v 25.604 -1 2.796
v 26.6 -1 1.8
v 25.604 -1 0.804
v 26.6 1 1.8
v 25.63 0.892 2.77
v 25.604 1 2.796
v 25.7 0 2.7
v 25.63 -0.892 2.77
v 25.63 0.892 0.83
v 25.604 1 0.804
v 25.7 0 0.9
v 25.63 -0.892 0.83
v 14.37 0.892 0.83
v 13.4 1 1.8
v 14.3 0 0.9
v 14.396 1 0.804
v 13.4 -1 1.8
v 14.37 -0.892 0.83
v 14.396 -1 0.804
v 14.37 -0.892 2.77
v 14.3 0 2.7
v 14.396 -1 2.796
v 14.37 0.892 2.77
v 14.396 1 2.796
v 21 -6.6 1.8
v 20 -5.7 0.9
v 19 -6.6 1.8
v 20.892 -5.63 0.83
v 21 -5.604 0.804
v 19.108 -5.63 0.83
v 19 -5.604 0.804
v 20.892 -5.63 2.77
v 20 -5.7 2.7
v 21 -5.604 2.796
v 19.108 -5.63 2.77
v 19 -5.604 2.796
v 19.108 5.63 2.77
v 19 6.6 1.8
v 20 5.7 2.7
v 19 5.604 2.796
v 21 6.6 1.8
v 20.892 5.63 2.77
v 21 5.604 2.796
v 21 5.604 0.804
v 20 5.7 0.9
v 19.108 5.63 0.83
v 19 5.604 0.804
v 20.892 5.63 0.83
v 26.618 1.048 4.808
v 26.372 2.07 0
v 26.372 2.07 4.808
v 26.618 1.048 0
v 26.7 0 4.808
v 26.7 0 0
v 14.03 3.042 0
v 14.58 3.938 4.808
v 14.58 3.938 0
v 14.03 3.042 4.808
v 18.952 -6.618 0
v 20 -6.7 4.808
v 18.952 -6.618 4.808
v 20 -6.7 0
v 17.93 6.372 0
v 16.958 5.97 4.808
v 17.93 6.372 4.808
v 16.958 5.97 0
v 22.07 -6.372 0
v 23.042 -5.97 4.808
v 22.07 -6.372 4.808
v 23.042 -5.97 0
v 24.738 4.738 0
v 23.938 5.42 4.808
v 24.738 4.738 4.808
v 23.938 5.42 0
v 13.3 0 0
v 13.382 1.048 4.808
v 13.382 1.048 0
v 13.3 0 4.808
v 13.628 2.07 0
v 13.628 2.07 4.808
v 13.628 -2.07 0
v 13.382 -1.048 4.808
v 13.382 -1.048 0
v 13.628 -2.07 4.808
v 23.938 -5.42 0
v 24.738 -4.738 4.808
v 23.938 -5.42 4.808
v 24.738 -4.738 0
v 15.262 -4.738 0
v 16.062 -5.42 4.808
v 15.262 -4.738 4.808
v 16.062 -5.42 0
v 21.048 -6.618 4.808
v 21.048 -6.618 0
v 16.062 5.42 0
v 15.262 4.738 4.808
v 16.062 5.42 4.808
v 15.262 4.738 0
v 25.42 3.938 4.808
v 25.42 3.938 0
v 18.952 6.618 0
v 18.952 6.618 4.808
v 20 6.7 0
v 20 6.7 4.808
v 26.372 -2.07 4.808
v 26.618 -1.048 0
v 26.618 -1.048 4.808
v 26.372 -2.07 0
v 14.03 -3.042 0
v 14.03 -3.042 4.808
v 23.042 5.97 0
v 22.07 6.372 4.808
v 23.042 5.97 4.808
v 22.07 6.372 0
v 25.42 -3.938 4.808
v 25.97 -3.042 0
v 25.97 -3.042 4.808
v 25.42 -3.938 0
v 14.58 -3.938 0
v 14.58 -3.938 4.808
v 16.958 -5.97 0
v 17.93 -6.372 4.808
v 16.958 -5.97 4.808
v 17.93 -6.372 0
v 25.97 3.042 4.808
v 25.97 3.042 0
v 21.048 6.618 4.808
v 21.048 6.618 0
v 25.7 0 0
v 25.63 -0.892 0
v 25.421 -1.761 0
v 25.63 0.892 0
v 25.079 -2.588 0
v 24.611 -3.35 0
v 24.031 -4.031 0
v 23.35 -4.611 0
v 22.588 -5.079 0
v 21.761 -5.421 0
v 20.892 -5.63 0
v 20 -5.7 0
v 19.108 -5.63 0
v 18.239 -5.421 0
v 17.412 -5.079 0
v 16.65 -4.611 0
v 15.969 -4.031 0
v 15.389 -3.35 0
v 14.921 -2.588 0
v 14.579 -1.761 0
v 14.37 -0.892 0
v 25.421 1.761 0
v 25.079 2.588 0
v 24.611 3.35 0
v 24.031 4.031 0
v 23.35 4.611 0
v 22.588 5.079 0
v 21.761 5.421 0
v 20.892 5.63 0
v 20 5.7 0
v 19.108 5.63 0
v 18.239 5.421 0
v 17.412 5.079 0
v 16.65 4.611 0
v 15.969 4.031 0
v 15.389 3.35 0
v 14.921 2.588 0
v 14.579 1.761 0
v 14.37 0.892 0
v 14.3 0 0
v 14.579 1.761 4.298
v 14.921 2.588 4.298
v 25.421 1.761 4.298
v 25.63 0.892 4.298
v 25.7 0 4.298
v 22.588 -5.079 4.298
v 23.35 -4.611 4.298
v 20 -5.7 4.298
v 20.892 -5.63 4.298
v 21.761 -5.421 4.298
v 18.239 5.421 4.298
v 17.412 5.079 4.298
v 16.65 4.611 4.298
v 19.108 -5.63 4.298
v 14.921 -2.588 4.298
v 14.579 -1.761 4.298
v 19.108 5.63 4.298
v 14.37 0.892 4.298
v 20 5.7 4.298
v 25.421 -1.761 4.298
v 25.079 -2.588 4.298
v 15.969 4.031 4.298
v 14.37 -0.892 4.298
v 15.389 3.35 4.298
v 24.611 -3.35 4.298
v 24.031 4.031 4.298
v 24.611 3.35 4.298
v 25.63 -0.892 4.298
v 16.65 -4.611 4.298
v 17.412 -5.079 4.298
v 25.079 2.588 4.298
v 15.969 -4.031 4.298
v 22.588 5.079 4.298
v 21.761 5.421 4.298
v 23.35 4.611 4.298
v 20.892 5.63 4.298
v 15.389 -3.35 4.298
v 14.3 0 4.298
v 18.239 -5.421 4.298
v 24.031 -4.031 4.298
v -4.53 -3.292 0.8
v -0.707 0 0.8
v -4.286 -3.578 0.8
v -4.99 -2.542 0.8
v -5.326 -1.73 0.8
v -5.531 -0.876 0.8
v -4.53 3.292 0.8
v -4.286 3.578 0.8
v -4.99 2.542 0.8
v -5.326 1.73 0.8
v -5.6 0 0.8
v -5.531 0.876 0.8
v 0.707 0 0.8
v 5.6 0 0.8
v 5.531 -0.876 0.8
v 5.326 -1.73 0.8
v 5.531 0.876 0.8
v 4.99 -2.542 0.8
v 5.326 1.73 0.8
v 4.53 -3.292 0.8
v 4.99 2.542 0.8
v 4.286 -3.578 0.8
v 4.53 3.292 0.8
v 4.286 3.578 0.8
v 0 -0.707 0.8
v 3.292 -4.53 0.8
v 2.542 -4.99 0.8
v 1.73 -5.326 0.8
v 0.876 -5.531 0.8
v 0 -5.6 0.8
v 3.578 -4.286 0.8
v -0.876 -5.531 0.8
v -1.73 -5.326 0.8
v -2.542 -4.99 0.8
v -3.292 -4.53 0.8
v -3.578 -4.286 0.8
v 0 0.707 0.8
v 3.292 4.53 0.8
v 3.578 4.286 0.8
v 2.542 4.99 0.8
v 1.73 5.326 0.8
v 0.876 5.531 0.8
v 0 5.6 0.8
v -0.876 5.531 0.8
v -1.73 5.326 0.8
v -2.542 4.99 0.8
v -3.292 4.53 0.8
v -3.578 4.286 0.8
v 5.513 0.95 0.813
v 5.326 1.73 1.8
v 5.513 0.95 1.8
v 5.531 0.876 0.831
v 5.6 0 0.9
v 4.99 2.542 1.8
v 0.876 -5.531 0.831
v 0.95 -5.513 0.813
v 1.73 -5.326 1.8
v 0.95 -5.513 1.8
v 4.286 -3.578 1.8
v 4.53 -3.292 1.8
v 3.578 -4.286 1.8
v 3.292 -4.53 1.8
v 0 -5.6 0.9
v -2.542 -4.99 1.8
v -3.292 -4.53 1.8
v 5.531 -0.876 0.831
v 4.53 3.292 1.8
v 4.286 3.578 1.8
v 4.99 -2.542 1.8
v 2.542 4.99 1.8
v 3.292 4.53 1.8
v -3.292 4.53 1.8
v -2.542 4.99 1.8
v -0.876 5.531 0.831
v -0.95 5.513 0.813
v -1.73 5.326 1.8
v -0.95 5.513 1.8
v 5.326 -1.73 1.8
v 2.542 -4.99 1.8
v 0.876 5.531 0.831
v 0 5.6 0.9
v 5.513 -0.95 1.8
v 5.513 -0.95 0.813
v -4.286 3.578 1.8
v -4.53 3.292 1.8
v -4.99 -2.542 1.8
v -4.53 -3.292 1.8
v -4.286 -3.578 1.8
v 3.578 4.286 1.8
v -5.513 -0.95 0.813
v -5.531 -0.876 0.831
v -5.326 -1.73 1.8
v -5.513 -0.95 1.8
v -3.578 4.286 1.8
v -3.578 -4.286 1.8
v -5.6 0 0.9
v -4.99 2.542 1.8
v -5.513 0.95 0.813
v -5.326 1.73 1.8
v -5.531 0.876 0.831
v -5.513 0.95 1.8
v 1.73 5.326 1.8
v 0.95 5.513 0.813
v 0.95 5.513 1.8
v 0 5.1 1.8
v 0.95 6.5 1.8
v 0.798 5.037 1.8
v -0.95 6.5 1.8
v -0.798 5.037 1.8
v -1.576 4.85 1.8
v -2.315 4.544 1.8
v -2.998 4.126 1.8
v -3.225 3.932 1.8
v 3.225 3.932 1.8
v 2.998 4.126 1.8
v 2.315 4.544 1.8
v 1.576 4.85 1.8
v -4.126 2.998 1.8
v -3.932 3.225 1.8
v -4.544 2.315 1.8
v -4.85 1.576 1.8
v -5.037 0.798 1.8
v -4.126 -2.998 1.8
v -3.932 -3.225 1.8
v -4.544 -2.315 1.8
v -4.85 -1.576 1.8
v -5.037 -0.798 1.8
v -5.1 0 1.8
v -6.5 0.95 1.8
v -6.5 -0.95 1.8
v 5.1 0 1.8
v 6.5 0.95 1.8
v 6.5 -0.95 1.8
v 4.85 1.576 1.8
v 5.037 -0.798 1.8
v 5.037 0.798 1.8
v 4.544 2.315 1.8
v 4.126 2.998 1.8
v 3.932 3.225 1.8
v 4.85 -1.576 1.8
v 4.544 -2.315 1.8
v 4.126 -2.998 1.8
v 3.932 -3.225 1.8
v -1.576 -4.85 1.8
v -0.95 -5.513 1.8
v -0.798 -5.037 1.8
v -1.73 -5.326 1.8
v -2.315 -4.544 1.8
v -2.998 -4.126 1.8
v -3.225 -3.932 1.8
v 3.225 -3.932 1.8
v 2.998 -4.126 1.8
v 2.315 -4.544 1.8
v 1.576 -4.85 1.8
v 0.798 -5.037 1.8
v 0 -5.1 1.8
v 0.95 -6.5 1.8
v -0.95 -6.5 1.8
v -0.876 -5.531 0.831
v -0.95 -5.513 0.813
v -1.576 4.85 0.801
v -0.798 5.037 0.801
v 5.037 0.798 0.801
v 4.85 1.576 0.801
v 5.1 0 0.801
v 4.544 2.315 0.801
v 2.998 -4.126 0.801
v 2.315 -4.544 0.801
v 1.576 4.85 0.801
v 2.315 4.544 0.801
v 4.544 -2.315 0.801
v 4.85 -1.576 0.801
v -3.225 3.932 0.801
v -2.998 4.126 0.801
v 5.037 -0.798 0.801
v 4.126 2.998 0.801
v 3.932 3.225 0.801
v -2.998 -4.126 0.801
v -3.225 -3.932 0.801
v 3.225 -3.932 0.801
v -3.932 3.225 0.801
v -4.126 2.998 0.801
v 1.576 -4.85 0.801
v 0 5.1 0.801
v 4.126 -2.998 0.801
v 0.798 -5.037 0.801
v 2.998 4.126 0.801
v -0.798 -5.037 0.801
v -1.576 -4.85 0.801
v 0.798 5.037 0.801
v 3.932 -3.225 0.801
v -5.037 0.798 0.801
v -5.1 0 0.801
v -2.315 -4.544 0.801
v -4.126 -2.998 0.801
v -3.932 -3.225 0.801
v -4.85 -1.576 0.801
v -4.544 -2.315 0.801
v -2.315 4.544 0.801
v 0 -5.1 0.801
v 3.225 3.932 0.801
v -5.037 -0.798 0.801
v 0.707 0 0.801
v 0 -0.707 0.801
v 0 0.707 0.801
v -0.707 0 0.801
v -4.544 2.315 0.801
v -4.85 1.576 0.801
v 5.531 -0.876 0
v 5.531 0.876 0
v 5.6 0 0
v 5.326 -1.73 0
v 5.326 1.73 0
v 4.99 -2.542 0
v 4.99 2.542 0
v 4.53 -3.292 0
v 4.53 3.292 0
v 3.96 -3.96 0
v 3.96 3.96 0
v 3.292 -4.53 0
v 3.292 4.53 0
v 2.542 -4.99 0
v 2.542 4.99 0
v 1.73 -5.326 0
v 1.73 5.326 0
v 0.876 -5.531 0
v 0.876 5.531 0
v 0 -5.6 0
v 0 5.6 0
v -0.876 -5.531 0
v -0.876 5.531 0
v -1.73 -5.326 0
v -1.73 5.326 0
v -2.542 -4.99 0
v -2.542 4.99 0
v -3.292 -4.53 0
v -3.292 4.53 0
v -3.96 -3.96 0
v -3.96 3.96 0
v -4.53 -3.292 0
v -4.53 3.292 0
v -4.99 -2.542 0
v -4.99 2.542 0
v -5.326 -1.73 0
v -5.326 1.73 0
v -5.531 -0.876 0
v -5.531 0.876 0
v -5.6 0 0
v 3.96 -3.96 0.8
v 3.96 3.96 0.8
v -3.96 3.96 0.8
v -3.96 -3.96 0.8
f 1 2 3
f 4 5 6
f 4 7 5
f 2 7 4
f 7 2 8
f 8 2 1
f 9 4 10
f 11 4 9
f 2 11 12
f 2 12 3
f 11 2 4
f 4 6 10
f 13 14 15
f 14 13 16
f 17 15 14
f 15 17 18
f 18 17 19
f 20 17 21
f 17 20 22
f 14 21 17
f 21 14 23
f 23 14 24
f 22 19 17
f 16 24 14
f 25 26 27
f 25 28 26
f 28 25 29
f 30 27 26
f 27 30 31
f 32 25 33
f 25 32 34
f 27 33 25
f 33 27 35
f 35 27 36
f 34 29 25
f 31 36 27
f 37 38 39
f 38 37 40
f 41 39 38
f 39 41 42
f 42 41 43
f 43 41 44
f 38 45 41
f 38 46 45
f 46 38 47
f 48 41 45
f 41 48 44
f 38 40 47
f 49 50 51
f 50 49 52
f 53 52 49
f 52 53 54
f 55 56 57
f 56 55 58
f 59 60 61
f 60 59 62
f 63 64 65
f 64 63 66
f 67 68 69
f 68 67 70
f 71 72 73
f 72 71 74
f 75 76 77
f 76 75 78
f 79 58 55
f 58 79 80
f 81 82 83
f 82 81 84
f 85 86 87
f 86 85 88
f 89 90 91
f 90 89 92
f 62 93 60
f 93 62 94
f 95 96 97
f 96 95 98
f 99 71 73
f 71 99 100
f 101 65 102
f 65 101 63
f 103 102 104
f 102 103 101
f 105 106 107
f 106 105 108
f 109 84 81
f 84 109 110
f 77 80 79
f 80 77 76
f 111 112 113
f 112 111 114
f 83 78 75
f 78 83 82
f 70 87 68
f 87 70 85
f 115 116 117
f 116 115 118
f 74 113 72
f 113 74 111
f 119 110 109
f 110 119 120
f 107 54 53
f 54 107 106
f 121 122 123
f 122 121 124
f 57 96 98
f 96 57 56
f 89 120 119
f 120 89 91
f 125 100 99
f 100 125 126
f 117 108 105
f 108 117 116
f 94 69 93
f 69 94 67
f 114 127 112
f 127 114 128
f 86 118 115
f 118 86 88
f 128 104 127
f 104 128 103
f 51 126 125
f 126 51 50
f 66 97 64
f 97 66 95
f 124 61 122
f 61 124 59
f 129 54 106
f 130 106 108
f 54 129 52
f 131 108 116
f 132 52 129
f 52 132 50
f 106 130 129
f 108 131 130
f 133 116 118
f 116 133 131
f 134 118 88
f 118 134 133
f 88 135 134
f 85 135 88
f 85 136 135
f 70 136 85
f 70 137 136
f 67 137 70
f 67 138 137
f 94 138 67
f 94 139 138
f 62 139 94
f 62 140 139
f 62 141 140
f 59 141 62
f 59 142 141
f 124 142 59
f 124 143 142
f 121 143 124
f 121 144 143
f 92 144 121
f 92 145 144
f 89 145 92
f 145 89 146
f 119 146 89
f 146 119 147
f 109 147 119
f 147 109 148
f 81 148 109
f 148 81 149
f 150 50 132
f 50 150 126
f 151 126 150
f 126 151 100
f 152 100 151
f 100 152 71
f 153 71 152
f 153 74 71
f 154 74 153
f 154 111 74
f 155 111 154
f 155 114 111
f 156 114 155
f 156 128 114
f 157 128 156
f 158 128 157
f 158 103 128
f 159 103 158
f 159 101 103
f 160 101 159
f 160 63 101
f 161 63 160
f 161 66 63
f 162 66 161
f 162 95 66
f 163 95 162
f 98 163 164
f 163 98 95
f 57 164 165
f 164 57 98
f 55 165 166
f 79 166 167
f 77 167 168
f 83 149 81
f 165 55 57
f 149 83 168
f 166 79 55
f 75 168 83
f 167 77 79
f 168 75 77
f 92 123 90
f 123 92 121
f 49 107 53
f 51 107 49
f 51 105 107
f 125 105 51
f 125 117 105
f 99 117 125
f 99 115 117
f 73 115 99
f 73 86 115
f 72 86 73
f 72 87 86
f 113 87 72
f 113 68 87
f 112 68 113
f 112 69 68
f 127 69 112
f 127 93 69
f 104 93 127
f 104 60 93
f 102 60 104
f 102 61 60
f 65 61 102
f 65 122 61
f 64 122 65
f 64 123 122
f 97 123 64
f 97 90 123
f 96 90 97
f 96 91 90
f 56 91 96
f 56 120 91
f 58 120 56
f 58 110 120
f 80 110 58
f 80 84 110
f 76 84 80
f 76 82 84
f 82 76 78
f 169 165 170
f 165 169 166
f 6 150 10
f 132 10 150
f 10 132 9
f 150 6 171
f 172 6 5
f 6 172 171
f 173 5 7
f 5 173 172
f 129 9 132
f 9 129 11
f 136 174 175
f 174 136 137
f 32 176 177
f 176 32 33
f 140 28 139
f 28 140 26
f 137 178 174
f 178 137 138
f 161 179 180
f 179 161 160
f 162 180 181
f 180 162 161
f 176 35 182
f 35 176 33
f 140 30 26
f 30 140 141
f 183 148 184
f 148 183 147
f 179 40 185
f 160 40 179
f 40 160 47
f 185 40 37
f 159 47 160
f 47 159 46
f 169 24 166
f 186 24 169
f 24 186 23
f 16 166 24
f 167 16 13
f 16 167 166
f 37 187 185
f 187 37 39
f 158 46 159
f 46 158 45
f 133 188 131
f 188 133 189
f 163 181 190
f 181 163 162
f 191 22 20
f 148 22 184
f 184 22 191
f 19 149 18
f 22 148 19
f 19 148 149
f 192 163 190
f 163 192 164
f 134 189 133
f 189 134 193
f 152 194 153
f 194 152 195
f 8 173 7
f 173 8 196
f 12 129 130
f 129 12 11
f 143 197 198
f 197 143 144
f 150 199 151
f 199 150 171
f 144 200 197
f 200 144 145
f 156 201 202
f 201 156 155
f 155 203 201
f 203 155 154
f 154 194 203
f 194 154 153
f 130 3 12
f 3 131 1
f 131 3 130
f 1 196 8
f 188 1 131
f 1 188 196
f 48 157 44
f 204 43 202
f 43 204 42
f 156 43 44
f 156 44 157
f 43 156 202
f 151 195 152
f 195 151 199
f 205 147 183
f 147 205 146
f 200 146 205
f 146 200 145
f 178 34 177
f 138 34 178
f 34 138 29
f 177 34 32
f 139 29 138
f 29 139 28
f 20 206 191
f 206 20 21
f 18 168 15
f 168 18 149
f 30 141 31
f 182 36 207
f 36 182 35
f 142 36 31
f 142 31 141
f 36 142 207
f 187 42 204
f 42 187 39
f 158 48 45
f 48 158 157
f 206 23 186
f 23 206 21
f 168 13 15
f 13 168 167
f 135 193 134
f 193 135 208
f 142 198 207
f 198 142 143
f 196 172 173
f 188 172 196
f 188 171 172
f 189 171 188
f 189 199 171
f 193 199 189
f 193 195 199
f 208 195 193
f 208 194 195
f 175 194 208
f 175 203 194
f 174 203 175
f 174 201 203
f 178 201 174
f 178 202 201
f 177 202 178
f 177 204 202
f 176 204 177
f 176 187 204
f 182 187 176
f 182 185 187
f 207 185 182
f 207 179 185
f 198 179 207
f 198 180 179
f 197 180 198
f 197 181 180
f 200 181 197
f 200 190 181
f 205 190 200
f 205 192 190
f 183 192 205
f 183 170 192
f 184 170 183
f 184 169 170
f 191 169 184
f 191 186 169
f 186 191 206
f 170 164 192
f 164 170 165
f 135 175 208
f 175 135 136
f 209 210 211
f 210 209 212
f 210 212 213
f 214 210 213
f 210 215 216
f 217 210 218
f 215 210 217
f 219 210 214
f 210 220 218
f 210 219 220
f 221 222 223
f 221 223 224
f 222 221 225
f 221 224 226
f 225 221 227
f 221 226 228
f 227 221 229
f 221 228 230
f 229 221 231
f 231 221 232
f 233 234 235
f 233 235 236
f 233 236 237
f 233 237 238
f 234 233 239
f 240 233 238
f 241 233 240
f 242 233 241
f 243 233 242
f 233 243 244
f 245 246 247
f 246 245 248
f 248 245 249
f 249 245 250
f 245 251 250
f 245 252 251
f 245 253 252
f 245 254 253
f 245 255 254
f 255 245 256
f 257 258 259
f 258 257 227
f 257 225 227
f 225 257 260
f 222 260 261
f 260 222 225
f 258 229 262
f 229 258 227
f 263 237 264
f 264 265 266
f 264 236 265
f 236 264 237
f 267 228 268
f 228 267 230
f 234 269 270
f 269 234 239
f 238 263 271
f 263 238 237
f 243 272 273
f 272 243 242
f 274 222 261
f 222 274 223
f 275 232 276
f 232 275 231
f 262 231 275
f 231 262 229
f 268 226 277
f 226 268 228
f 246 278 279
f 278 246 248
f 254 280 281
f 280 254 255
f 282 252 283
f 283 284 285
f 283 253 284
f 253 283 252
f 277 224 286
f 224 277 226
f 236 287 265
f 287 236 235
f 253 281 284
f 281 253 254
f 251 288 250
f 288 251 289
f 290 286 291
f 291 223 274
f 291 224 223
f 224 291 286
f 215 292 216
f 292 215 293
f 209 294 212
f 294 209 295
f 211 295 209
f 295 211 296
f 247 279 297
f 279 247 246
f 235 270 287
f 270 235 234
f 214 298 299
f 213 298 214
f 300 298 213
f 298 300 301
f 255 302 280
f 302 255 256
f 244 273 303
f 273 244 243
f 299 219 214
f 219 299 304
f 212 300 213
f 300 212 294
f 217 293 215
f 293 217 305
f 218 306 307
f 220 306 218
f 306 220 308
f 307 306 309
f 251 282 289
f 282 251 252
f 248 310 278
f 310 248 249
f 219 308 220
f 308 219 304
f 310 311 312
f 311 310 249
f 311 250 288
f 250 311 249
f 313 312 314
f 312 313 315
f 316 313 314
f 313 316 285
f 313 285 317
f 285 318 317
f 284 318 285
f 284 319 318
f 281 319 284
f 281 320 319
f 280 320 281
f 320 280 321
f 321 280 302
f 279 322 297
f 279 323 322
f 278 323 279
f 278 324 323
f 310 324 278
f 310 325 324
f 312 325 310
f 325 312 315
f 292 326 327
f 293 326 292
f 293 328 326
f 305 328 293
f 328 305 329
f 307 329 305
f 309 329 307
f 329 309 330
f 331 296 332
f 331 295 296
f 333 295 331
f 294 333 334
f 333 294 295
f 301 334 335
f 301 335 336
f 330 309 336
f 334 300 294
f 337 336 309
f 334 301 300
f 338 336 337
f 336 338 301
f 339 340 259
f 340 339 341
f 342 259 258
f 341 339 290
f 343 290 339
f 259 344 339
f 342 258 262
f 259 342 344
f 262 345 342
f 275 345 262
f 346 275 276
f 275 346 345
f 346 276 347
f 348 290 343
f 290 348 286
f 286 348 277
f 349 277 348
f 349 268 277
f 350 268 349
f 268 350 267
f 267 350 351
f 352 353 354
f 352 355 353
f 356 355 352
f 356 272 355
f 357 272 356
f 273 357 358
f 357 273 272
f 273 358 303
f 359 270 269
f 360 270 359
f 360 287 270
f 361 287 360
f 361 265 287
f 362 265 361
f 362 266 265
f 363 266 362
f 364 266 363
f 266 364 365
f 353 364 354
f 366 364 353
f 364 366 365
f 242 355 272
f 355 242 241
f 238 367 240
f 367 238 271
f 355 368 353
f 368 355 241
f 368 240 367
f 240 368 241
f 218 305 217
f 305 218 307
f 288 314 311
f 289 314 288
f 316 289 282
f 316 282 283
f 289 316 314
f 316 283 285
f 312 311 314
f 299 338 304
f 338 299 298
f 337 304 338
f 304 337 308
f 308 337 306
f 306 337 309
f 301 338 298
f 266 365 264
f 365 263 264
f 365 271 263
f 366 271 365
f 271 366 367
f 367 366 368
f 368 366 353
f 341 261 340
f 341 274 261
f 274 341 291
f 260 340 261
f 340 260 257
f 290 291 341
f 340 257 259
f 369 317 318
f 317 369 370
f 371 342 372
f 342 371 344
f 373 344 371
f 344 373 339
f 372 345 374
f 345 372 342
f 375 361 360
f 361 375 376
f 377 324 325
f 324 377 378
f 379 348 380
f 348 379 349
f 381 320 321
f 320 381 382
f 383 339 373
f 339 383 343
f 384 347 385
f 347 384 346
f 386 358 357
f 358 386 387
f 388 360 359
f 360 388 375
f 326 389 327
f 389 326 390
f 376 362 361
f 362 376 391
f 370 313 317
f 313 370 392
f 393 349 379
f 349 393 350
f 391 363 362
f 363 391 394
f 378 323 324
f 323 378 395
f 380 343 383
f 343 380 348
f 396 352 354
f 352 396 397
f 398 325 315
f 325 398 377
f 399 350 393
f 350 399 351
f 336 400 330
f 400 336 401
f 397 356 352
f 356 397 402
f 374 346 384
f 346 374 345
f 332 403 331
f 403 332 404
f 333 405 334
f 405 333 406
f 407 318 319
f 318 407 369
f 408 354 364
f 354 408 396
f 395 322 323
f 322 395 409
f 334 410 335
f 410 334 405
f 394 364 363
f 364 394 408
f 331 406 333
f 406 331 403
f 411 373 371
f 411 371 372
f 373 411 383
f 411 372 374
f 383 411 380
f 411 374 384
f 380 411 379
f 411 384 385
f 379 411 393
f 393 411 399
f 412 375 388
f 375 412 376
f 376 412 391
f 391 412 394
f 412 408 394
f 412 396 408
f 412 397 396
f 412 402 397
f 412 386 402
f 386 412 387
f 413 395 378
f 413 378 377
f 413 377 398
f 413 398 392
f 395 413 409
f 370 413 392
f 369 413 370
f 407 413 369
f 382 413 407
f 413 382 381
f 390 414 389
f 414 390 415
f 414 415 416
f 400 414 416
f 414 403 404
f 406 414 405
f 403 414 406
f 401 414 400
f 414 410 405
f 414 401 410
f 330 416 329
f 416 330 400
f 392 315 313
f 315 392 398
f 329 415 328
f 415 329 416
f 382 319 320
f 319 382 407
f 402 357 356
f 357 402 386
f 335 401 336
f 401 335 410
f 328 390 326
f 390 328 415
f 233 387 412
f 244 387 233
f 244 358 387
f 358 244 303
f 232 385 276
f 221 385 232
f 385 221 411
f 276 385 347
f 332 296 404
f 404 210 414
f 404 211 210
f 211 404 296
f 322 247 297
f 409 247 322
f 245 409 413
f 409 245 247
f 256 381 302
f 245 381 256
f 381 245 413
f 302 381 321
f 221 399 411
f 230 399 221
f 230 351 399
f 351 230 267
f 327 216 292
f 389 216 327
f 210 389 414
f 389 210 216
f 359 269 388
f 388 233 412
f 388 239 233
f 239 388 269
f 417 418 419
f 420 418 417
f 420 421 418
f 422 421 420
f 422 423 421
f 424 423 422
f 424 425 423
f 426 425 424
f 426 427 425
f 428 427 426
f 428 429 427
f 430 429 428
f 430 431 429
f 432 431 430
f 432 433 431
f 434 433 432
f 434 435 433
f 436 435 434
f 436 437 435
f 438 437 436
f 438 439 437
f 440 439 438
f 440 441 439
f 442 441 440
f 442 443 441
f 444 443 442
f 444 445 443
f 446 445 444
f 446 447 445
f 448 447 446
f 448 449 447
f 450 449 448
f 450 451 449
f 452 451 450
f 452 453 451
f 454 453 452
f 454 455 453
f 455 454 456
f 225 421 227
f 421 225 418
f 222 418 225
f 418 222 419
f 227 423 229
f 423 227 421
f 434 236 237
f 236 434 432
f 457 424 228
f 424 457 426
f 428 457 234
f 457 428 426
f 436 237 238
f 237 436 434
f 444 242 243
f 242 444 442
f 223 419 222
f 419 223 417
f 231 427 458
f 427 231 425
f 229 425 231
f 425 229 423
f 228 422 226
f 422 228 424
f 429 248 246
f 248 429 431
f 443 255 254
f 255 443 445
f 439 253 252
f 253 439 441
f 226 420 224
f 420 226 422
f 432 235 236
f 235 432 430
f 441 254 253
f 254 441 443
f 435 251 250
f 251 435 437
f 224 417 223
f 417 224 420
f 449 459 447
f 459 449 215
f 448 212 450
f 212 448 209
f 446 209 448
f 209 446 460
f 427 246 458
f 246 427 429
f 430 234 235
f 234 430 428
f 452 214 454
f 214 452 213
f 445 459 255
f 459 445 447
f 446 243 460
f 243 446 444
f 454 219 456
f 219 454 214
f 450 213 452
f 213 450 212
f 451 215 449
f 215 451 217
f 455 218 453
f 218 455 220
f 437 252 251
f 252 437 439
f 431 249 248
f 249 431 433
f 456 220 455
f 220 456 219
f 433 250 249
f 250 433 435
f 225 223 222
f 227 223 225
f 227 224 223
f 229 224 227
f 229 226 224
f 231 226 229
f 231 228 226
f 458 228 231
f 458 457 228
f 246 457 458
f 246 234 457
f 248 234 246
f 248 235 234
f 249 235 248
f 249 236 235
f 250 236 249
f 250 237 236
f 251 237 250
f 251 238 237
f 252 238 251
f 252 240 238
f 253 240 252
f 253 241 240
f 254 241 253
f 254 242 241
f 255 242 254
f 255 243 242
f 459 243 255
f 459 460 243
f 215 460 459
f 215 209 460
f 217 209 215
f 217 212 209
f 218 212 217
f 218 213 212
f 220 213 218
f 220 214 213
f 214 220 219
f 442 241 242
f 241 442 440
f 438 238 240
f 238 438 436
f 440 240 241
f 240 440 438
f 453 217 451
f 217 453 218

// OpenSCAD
// file: roundCornersCube.scad
/*
http://codeviewer.org/view/code:1b36 
Copyright (C) 2011 Sergio Vilches
This program is free software: you can redistribute it and/or modify it under the terms of the GNU General Public License as published by the Free Software Foundation, either version 3 of the License, or (at your option) any later version.
This program is distributed in the hope that it will be useful, but WITHOUT ANY WARRANTY; without even the implied warranty of MERCHANTABILITY or FITNESS FOR A PARTICULAR PURPOSE. See the GNU General Public License for more details. You should have received a copy of the GNU General Public License along with this program. If not, see <http://www.gnu.org/licenses/>.
Contact: s.vilches.e@gmail.com


    ----------------------------------------------------------- 
                 Round Corners Cube (Extruded)                
      roundCornersCube(x,y,z,r) Where:                        
         - x = Xdir width                                     
         - y = Ydir width                                     
         - z = Height of the cube                             
         - r = Rounding radious                               
                                                              
      Example: roundCornerCube(10,10,2,1);                    
     *Some times it's needed to use F6 to see good results!   
 	 ----------------------------------------------------------- 
*/
// Test it!
// roundCornersCube(10,5,2,1);


module createMeniscus(h,radius) // This module creates the shape that needs to be substracted from a cube to make its corners rounded.
difference(){        //This shape is basicly the difference between a quarter of cylinder and a cube
   translate([radius/2+0.1,radius/2+0.1,0]){
      cube([radius+0.2,radius+0.1,h+0.2],center=true);         // All that 0.x numbers are to avoid "ghost boundaries" when substracting
   }

   cylinder(h=h+0.2,r=radius,$fn = 25,center=true);
}


module rCube(x,y,z,r)  // Now we just substract the shape we have created in the four corners
difference(){
   cube([x,y,z], center=true);

translate([x/2-r,y/2-r]){  // We move to the first corner (x,y)
      rotate(0){  
         createMeniscus(z,r); // And substract the meniscus
      }
   }
   translate([-x/2+r,y/2-r]){ // To the second corner (-x,y)
      rotate(90){
         createMeniscus(z,r); // But this time we have to rotate the meniscus 90 deg
      }
   }
      translate([-x/2+r,-y/2+r]){ // ... 
      rotate(180){
         createMeniscus(z,r);
      }
   }
      translate([x/2-r,-y/2+r]){
      rotate(270){
         createMeniscus(z,r);
      }
   }
}

module createSubtractor(h,radius) //Create the shape that needs to be substracted from a cube
difference(){ cube([radius+0.1,radius+0.1,h]); cylinder(h=h,r=radius+0.1,$fn = 25); } //+0.1 stops ghost edges

module rCube(x,y,z,r)//Create a cube and subtract the 4 corners
difference(){
cube([x,y,z]);
translate([x-r,y-r]) rotate(0) createSubtractor(z,r); 
translate([r,y-r]) rotate(90) createSubtractor(z,r);
translate([r,r]) rotate(180) createSubtractor(z,r);
translate([x-r,r]) rotate(270) createSubtractor(z,r);
}
// file: wallet.scad
include <roundCornersCube.scad>

//credit card width
cw = 53.98;

ch = 85.6;

w = 5;

module credit_card()
{
rCube(cw,ch,1.5,5);


}

module wallet()
{
rCube(cw+w*2, ch+w*2, 8, 6);


}


translate([0,0,20])
credit_card();

minkowski()
{
sphere(r=3);
wallet();
}
// main file
$fn = 40;
use <wallet.scad>


//rounding
r = 4;

//width
w = 60;

//bottom roof length
brl = 20;

//top roof length
trl = 50;

//won't fall out give width
wfogw = 3;

//won't fall out give height
wfogh = .4;

//hinge give
hg = .25;

//give between hinge and wallet
give = -.2;

//distance between cylinders in hinge

dc = 8.5+1;

//hinge radius1
hr1 = 3.4;

hr2 = 1;

//cylinder height
ch = 5;

//total hinge distance
th = dc+ch*2;


//distance between hinges
dh = th;

//wall thickness
wth = 2;

//magnet hole radius
mhr = 5.7;

//magnet wall thickness
mwth = 1;

//magnet hole height
mhh = 4.4+1;

//difference in height between top and bottom
diff = 0;


hh = hr1*sqrt(2)-wfogh-wth;
c = w - wth*2 - wfogw*2;
R = hh/2 + c*c/(8*hh);


module hinge_m(left=true, right=true)
{
r1 = hr1;
r2 = hr2;


rotate([0,90,0])
cylinder(r=hr1, h=th);


//cones
if(left){
rotate([0,-90,0])
cylinder(r1=r1, r2=r2, h=ch);
}

if(right){
translate([ch*2+dc,0,0])
rotate([0,90,0])
cylinder(r1=r1, r2=r2, h=ch);
}


rotate([135,0,0])
translate([0,-hr1,0])
cube([th,hr1*2,hr1]);



//support box
translate([0,-hr1*sqrt(2),-hr1*sqrt(2)])
cube([th,hr1*sqrt(2),hr1*sqrt(2)]);


//give box
translate([0,-give-hr1*sqrt(2),-hr1*sqrt(2)])
cube([th,give,hr1*sqrt(2)]);


}




module hinge_f()
{

difference()
{
union()
{

rotate([135,0,0])
translate([-th+hg,-hr1,0])
cube([th-hg*2,hr1*2,hr1]);


//support box
translate([-th+hg,-hr1*sqrt(2),-hr1*sqrt(2)])
cube([th-hg*2,hr1*sqrt(2),hr1*sqrt(2)]);

//give box
translate([-th+hg,-give-hr1*sqrt(2),-hr1*sqrt(2)])
cube([th-hg*2,give,hr1*sqrt(2)]);



translate([-th,0,0])
rotate([0,90,0])
cylinder(r=hr1,h=th);
}

translate([.01,0,0])
rotate([0,-90,0])
cylinder(r1=hr1+hg, r2=hr2+hg,h=ch+hg);


translate([-th-.01,0,0])
rotate([0,90,0])
cylinder(r1=hr1+hg, r2=hr2+hg,h=ch+hg);
}
}



//space for cards
module bottom()
{

//roof!
translate([th*5-brl,0,hr1*sqrt(2)-.75+diff])
{
rCube(brl,58,.75,r);
cube([brl-10,58,.75]);
}

//translate([0,w/2,R+wth]) rotate([0,90,0]) cylinder(r=R, h=wth, $fn=200);


difference()
{
union()
{

rCube(th*5,w,hr1*sqrt(2)+diff,r);

//translate([0,0,0])
cube([th*5,4,hr1*sqrt(2)]);

}

translate([wth,wth,wth])
rCube(th*5+r-wth*4,w-wth*2,hr1*2,r);


translate([-.1,w/2,R+wth]) rotate([0,90,0]) cylinder(r=R, h=wth+1, $fn=200);


}

}


//space for money
module top()
{

//roof!
translate([th*5-trl,0,hr1*sqrt(2)-.75-diff])
{
rCube(trl,58,.75,r);
cube([trl-10,58,.75]);

}

//so the cards won't fall out when shut!
//translate([0, wth+wfogw, 0])
//rCube(5,w-wth*2-wfogw*2,hr1*sqrt(2)*2-wfogh-wth,r);


intersection()
{
translate([0,(w-wth)/2,-R+hr1*sqrt(2)+wth])
rotate([0,90,0])
cylinder(r=R, h=wth, $fn=200);

translate([0,-R/2,hr1*sqrt(2)])
cube([20,R*2,20]);
}

difference()
{
union()
{
rCube(th*5,w,hr1*sqrt(2)-diff,r);


translate([th*2.5,-hr1*sqrt(2)+give-w+hg-wth*2,0])
magnet_holder();

}

translate([wth,wth,wth])
rCube(th*5-r,w-wth*2,hr1*2,r);

}
}


module magnet_holder_plug()
{
rr = mhr-.1;
cylinder(r=rr, h=.8);
pth = .5;

module fastener()
{
 translate([-1.9/2,rr-.1,1])
  rotate([0,90,0])
  cylinder(r=1,h=1.9, $fn=4);
}

module pins()
{


  
  difference()
  {
  union()
  {
  cylinder(r=rr, h=1);
  

  //fasteners
  fastener();
  rotate([0,0,90])
  fastener();
  rotate([0,0,180])
  fastener();
  rotate([0,0,-90])
  fastener();
  
  }
  
  translate([0,0,.001])
  cylinder(r=rr-pth, h=1);

  translate([0,0,1])
  cylinder(r=rr+2,h=10);

  rotate([0,0,-45])
  translate([-.5,-rr-2,0])
  cube([1,rr*2+4,1.1]);

  rotate([0,0,45])
  translate([-.5,-rr-2,0])
  cube([1,rr*2+4,1.1]);



  }
}

translate([0,0,.8])
pins();

}



module magnet_holder()
{

//magnet!
//translate([0,0,hr1*sqrt(2)-mwth/2-2.6])
//cylinder(r=5, h=2.6);

difference()
{
cylinder(r=mhr+mwth, h=hr1*sqrt(2));

translate([0,0,-.01])
cylinder(r=mhr, h=hr1*sqrt(2)-mwth/2);

//translate([-mhr*2,0,0])
//cube([20,20,20]);


translate([0,0,.8])
{
rotate([0,0,90])
translate([-1,-mhr+.1,1])
rotate([0,90,0])
cylinder(r=1, h=2, $fn=4);

rotate([0,0,-90])
translate([-1,-mhr+.1,1])
rotate([0,90,0])
cylinder(r=1, h=2, $fn=4);


rotate([0,0,0])
translate([-1,-mhr+.1,1])
rotate([0,90,0])
cylinder(r=1, h=2, $fn=4);

rotate([0,0,180])
translate([-1,-mhr+.1,1])
rotate([0,90,0])
cylinder(r=1, h=2, $fn=4);

}



}

}


//translate([-th,-hr1*sqrt(2)+give-w+hg-5,-hr1*sqrt(2)])
//magnet_holder();


/*
mirror([0,0,0])
{
//HINGES!!!

hinge_m(right=false);
translate([-th*2,0,0])
hinge_m();
translate([-th*4,0,0])
hinge_m(left=false, right=true);



mirror([0,1,0])
{
hinge_f();
translate([-th*2,0,0])
hinge_f();
}

translate([-th*4,-hr1*sqrt(2)-give,-hr1*sqrt(2)])
mirror([0,1,0])
bottom();



translate([-th*4,hr1*sqrt(2)+give,-hr1*sqrt(2)])
top();
}
*/


translate([20,0,0])
magnet_holder();

magnet_holder_plug();
